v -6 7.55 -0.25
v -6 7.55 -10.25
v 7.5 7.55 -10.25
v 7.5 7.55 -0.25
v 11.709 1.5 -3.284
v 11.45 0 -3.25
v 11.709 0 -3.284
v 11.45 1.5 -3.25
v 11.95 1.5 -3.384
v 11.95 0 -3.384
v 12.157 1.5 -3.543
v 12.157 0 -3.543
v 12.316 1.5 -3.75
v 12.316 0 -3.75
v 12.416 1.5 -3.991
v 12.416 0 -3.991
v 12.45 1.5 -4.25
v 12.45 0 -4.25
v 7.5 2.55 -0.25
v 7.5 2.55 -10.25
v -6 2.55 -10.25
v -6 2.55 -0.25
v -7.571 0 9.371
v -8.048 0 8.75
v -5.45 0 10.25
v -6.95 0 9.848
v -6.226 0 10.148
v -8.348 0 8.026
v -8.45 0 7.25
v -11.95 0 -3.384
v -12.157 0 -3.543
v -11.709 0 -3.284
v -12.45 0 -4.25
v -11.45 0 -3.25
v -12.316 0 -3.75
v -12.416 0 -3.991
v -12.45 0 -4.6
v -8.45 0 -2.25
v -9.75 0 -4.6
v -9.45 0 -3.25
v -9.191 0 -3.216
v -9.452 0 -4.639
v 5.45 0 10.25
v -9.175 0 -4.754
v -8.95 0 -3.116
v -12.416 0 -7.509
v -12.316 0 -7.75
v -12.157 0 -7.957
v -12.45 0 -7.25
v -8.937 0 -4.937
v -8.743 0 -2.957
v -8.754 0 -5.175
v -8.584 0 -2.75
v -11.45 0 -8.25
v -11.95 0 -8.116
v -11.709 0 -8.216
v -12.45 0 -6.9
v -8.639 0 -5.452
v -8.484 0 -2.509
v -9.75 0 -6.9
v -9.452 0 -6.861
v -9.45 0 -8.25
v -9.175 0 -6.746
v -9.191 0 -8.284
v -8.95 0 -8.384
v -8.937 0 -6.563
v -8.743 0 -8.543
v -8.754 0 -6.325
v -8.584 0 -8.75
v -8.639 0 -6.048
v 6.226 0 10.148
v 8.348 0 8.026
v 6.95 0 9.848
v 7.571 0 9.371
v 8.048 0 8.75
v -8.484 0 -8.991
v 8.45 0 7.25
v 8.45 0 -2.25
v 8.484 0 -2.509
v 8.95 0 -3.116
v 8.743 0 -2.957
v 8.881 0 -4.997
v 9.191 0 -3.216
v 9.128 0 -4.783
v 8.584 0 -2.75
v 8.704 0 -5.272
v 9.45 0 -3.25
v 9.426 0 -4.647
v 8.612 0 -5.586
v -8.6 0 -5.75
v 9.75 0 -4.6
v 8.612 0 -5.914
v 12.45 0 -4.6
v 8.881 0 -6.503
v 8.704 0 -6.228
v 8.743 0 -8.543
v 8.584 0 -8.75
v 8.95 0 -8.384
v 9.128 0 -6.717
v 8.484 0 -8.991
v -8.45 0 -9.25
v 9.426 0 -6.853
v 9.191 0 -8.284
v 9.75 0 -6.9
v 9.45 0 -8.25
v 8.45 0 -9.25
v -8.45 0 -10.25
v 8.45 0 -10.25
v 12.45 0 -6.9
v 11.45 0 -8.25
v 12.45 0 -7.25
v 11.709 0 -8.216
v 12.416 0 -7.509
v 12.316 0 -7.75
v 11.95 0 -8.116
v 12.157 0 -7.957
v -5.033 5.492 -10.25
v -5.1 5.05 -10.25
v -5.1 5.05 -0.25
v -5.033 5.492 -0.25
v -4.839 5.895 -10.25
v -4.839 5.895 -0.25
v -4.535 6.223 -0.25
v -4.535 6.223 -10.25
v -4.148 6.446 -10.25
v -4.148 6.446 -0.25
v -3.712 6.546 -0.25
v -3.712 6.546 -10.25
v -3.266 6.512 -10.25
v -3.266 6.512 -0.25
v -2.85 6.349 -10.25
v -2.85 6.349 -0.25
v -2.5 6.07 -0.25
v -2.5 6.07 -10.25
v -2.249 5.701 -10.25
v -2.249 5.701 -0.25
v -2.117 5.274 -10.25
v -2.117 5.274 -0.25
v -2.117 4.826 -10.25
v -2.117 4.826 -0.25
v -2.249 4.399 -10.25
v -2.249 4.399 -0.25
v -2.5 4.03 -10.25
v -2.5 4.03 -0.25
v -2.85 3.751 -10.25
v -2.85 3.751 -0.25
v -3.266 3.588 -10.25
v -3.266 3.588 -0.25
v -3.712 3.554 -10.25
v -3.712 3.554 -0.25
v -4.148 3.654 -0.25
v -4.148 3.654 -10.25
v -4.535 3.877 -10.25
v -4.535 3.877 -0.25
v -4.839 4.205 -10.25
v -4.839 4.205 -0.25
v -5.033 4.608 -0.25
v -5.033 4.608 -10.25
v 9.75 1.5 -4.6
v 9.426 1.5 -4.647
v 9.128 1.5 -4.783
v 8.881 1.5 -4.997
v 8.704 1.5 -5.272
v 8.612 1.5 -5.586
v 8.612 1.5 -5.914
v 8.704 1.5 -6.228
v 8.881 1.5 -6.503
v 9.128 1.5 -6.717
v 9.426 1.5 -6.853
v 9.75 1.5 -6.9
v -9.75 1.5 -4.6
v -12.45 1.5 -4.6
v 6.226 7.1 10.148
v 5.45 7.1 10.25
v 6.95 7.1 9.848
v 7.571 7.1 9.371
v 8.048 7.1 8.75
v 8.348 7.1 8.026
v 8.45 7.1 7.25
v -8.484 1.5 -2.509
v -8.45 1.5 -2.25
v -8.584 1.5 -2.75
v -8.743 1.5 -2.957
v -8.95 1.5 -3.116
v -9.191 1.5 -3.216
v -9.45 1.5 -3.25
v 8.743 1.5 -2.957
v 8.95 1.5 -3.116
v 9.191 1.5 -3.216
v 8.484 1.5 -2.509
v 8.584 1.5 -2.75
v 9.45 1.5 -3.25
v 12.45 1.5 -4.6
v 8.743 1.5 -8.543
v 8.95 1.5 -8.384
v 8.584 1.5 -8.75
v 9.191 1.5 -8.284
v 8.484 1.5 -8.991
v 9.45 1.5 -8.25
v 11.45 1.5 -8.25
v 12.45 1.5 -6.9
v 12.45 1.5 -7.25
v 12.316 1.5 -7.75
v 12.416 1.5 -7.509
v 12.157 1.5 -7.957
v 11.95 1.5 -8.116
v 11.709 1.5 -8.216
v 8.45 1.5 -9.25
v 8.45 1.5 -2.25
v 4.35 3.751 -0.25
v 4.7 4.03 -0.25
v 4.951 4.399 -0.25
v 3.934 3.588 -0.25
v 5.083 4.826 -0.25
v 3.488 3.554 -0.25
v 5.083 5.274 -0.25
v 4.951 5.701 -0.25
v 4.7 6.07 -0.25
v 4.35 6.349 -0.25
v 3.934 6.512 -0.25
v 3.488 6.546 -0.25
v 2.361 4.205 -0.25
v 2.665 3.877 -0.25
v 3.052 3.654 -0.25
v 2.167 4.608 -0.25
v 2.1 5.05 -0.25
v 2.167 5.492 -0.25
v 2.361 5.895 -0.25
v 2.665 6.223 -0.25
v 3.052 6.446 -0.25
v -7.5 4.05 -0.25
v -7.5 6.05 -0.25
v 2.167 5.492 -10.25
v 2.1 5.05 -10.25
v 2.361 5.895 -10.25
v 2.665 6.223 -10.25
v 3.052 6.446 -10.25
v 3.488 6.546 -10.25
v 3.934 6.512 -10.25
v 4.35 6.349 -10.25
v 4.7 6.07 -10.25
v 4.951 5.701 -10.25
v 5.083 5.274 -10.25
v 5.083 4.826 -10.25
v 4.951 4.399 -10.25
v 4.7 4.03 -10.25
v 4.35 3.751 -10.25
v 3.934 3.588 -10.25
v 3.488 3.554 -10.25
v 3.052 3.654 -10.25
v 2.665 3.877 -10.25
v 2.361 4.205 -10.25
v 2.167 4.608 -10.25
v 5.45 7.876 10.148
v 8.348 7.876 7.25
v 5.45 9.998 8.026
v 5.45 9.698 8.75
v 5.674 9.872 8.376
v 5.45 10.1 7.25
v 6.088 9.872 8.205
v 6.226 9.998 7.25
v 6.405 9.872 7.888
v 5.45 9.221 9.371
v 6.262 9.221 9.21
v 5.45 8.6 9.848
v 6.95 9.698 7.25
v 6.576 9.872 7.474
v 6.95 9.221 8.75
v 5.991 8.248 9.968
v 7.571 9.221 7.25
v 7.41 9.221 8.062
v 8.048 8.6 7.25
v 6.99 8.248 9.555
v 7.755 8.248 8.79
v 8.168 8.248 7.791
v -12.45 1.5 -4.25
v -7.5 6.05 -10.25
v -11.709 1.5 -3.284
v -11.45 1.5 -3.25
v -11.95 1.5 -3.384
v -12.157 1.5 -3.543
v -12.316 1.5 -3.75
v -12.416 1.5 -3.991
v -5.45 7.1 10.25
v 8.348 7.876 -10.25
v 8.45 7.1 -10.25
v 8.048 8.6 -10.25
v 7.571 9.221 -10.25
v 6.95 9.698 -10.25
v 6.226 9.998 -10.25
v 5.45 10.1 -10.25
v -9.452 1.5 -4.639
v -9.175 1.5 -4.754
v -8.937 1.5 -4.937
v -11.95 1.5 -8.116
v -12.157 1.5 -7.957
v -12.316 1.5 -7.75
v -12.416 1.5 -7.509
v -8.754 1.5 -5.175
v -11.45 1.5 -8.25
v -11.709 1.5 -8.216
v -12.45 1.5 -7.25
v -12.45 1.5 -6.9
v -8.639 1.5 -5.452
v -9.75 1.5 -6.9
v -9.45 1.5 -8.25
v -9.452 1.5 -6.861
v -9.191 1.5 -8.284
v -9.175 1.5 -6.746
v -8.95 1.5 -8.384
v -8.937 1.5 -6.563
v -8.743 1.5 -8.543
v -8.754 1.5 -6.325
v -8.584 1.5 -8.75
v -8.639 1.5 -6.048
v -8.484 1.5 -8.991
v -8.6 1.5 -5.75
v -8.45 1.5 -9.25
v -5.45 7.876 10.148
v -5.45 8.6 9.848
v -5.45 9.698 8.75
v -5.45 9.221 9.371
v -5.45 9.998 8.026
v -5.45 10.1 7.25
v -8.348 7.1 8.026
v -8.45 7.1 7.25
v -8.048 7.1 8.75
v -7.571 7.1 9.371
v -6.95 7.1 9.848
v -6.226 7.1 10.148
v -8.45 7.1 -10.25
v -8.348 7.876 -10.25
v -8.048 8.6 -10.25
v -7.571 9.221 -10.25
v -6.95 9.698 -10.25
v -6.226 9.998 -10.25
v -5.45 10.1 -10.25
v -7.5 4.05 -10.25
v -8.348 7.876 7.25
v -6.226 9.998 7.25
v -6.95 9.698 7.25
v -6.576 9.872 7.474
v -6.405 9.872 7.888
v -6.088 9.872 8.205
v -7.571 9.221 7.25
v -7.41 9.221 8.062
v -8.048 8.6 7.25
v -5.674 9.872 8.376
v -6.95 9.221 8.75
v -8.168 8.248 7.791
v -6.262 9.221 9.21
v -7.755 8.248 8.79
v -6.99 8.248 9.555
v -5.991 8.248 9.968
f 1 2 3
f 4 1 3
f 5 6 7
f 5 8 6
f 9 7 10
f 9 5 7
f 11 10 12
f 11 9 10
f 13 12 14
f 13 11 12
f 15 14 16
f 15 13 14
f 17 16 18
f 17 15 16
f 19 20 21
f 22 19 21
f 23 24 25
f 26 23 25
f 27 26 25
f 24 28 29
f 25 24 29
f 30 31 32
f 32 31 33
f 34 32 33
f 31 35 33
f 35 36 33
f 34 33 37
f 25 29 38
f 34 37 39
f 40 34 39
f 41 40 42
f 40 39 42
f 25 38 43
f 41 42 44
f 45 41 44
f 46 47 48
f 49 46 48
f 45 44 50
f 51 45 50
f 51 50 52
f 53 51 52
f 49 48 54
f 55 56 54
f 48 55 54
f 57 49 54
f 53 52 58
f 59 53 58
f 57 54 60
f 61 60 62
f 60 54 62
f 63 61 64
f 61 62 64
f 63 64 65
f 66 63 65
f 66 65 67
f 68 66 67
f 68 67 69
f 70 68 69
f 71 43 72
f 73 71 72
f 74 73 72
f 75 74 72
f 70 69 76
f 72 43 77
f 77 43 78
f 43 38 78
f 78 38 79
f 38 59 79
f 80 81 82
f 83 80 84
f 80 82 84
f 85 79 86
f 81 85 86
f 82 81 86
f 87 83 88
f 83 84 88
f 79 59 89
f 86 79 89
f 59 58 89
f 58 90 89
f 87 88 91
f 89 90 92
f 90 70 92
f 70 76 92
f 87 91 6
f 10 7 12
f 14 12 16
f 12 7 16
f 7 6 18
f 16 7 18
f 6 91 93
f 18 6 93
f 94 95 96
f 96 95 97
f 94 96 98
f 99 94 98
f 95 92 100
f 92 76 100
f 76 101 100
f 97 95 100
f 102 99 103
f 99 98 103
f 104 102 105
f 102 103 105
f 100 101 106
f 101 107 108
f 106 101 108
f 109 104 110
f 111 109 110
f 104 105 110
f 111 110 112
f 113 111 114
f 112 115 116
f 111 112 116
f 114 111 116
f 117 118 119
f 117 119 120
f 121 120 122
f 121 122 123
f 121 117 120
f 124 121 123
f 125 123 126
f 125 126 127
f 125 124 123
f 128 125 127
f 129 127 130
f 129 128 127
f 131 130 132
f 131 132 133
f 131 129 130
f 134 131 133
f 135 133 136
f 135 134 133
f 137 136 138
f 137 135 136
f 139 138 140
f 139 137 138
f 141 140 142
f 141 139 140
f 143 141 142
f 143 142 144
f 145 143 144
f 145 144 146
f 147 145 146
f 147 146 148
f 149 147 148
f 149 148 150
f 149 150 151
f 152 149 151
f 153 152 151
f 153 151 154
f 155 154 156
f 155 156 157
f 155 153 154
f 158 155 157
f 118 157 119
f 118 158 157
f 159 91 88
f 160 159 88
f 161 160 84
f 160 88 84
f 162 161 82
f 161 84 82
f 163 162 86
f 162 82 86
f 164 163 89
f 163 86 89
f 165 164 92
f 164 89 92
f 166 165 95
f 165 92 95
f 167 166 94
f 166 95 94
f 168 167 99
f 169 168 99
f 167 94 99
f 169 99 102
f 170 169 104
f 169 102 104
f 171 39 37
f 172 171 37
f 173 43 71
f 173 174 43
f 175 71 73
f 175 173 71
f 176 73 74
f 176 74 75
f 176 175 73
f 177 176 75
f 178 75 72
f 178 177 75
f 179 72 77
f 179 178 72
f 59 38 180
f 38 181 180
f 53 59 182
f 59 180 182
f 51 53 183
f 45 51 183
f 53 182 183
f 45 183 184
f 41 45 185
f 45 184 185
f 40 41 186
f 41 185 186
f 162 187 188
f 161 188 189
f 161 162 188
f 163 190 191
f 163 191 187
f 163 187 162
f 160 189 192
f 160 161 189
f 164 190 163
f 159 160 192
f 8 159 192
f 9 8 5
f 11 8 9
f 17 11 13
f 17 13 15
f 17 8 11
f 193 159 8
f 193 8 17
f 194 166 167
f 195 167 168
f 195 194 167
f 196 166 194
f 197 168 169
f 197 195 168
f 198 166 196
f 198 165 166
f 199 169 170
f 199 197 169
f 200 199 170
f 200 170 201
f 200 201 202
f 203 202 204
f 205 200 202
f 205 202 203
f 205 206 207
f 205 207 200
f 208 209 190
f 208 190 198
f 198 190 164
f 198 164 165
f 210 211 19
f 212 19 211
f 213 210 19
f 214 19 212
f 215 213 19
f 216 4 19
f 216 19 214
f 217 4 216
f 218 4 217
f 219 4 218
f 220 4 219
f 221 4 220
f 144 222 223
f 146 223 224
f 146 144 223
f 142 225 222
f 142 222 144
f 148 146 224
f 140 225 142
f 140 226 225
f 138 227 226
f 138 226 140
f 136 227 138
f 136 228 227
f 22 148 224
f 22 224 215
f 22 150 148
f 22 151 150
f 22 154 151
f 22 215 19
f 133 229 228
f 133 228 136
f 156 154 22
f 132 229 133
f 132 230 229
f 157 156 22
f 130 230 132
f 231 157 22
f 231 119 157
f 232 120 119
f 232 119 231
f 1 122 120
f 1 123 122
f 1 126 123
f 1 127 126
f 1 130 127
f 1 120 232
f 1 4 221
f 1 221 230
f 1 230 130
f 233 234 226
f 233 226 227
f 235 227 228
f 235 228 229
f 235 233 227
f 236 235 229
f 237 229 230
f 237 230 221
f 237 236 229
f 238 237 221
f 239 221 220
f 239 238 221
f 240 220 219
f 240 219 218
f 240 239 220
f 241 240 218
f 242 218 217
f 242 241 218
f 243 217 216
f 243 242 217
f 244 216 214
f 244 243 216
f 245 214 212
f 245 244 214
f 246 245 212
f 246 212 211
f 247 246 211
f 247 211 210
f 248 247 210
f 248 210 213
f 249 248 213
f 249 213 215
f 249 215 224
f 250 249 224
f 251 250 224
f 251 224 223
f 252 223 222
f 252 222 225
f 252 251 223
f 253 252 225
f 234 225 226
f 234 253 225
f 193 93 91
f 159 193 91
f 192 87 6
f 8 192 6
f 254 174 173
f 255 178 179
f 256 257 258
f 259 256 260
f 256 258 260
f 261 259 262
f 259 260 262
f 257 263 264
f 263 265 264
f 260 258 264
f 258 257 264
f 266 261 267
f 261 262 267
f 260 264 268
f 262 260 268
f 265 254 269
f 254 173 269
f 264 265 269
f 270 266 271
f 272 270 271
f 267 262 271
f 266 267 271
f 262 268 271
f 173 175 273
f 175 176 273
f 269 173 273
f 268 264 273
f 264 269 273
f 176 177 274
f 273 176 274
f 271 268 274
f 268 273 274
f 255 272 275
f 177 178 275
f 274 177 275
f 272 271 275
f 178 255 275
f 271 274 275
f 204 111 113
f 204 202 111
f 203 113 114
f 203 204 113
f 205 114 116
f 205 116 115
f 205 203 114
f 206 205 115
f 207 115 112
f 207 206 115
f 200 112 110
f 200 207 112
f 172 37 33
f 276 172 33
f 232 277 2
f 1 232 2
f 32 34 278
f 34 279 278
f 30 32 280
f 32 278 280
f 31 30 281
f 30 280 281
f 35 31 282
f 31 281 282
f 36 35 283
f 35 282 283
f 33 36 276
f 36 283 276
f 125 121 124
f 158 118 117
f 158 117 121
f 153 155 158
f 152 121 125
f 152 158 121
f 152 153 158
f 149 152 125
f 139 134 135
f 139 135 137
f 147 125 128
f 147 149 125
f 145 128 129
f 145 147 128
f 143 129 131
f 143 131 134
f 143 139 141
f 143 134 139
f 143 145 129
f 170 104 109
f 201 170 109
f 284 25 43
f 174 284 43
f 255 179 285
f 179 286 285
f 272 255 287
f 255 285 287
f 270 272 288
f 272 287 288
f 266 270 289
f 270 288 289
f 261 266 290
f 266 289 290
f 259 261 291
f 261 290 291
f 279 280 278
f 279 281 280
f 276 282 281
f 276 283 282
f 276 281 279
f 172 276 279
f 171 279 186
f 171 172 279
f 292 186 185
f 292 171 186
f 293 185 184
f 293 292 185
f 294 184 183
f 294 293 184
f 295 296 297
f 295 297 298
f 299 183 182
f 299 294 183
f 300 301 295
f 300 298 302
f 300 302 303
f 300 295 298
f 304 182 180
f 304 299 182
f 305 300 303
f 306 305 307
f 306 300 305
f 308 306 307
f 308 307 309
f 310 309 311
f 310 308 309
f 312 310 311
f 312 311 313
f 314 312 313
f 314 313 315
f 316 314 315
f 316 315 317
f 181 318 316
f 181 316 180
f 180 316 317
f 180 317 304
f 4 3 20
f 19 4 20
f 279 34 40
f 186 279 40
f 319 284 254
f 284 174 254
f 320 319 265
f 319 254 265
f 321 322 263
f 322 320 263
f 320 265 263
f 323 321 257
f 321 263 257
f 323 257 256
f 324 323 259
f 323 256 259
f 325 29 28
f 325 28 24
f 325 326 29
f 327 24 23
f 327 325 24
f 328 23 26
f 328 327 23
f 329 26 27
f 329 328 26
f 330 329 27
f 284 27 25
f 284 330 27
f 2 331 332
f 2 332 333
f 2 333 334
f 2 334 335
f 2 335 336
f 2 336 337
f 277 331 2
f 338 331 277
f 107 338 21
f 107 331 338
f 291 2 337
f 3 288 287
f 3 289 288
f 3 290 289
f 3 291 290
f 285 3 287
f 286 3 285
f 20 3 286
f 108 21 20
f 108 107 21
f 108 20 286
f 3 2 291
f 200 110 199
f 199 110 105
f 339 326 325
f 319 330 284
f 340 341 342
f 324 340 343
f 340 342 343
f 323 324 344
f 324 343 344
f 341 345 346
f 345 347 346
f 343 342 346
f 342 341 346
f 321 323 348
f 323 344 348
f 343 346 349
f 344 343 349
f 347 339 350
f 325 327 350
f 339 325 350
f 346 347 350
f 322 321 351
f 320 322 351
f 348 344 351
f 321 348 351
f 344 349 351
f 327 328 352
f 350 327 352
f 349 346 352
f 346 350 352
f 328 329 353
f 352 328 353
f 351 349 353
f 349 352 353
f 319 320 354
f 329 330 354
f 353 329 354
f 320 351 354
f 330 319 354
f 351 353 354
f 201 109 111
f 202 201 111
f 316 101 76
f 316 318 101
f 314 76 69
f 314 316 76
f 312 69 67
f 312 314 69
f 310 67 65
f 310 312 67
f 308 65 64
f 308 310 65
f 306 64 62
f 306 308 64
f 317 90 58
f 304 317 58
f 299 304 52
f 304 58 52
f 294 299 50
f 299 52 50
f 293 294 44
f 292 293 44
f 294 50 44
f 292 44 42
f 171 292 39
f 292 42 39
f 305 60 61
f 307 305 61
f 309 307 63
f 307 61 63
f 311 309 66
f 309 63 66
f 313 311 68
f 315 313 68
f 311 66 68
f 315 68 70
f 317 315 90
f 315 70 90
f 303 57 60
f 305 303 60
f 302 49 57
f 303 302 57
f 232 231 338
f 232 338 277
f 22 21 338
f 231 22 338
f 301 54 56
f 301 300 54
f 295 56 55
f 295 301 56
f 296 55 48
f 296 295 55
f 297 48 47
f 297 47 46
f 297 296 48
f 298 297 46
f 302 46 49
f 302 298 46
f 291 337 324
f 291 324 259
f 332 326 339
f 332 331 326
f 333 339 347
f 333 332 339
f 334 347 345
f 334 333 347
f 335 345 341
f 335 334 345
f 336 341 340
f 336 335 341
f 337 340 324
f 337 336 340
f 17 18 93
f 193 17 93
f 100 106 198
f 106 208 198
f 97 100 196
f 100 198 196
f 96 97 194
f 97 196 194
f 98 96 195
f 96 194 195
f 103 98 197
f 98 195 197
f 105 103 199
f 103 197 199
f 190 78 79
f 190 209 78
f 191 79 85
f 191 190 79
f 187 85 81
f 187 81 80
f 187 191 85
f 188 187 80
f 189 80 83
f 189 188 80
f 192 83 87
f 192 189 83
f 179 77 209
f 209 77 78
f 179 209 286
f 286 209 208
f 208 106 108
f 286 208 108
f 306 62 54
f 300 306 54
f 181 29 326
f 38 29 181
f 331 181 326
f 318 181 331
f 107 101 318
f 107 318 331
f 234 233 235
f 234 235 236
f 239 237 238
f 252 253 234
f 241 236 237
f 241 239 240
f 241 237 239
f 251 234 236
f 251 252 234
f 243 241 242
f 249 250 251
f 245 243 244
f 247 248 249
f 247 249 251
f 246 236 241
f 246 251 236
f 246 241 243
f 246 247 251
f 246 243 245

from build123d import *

# Parameters (mm, degrees)
SKETCH1_W           = 16.9
SKETCH1_H           = 20.5
BOSS_EXTRUDE1_DEPTH = 1.5
SKETCH2_W           = 16.9
SKETCH2_H           = 20.5
BOSS_EXTRUDE2_DEPTH = 8.6
FILLET1_R           = 3
FILLET2_R           = 1
SKETCH3_R           = 1.5
CUT_EXTRUDE1_DEPTH  = 10


with BuildPart() as part:
    # Sketch1 → Boss-Extrude1 (new body)
    with BuildSketch(Plane(origin=(0, 0, 0), x_dir=(1, 0, 0), z_dir=(0, 1, 0))):
        with BuildLine():
            Line((-8.45, 3.25), (-8.45, 8.25))
            Line((-8.45, 8.25), (-12.45, 8.25))
            Line((-12.45, 8.25), (-12.45, 6.9))
            Line((-12.45, 6.9), (-9.75, 6.9))
            ThreePointArc((-9.75, 6.9), (-8.936827202, 6.563172798), (-8.6, 5.75))
            ThreePointArc((-8.6, 5.75), (-8.936827202, 4.936827202), (-9.75, 4.6))
            Line((-9.75, 4.6), (-12.45, 4.6))
            Line((-12.45, 4.6), (-12.45, 3.25))
            Line((-12.45, 3.25), (-8.45, 3.25))
        make_face()
        Rectangle(SKETCH1_W, SKETCH1_H)
        with BuildLine():
            Line((12.45, 8.25), (8.45, 8.25))
            Line((8.45, 8.25), (8.45, 3.25))
            Line((8.45, 3.25), (12.45, 3.25))
            Line((12.45, 3.25), (12.45, 4.6))
            Line((12.45, 4.6), (9.75, 4.6))
            ThreePointArc((9.75, 4.6), (8.6, 5.75), (9.75, 6.9))
            Line((9.75, 6.9), (12.45, 6.9))
            Line((12.45, 6.9), (12.45, 8.25))
        make_face()
    extrude(amount=BOSS_EXTRUDE1_DEPTH)

    # Sketch2 → Boss-Extrude2 (add)
    with BuildSketch(Plane(origin=(0, 1.5, 0), x_dir=(1, 0, 0), z_dir=(0, 1, 0))):
        Rectangle(SKETCH2_W, SKETCH2_H)
    extrude(amount=BOSS_EXTRUDE2_DEPTH)

    # Fillet1
    fillet1_edges = [part.edges().sort_by_distance(p)[0] for p in [
        (8.45, 5.05, 10.25),
        (-8.45, 5.05, 10.25),
        (-8.45, 10.1, 0),
        (0, 10.1, 10.25),
        (8.45, 10.1, 0),
    ]]
    fillet(fillet1_edges, radius=FILLET1_R)

    # Fillet2
    fillet2_edges = [part.edges().sort_by_distance(p)[0] for p in [
        (-12.45, 0.75, -8.25),
        (-8.45, 0.75, -8.25),
        (8.45, 0.75, -8.25),
        (12.45, 0.75, -8.25),
        (12.45, 0.75, -3.25),
        (8.45, 0.75, -3.25),
        (-8.45, 0.75, -3.25),
        (-12.45, 0.75, -3.25),
    ]]
    fillet(fillet2_edges, radius=FILLET2_R)

    # Sketch3 → Cut-Extrude1 (cut)
    with BuildSketch(Plane(origin=(0, 0, -10.25), x_dir=(-1, 0, 0), z_dir=(0, 0, -1))):
        Polygon((7.5, 4.05), (7.5, 6.05), (6, 7.55), (-7.5, 7.55), (-7.5, 2.55), (6, 2.55), align=None)
        with Locations((-3.6, 5.05)):
            Circle(SKETCH3_R, mode=Mode.SUBTRACT)
        with Locations((3.6, 5.05)):
            Circle(SKETCH3_R, mode=Mode.SUBTRACT)
    extrude(amount=-CUT_EXTRUDE1_DEPTH, mode=Mode.SUBTRACT)


solid = part.part
